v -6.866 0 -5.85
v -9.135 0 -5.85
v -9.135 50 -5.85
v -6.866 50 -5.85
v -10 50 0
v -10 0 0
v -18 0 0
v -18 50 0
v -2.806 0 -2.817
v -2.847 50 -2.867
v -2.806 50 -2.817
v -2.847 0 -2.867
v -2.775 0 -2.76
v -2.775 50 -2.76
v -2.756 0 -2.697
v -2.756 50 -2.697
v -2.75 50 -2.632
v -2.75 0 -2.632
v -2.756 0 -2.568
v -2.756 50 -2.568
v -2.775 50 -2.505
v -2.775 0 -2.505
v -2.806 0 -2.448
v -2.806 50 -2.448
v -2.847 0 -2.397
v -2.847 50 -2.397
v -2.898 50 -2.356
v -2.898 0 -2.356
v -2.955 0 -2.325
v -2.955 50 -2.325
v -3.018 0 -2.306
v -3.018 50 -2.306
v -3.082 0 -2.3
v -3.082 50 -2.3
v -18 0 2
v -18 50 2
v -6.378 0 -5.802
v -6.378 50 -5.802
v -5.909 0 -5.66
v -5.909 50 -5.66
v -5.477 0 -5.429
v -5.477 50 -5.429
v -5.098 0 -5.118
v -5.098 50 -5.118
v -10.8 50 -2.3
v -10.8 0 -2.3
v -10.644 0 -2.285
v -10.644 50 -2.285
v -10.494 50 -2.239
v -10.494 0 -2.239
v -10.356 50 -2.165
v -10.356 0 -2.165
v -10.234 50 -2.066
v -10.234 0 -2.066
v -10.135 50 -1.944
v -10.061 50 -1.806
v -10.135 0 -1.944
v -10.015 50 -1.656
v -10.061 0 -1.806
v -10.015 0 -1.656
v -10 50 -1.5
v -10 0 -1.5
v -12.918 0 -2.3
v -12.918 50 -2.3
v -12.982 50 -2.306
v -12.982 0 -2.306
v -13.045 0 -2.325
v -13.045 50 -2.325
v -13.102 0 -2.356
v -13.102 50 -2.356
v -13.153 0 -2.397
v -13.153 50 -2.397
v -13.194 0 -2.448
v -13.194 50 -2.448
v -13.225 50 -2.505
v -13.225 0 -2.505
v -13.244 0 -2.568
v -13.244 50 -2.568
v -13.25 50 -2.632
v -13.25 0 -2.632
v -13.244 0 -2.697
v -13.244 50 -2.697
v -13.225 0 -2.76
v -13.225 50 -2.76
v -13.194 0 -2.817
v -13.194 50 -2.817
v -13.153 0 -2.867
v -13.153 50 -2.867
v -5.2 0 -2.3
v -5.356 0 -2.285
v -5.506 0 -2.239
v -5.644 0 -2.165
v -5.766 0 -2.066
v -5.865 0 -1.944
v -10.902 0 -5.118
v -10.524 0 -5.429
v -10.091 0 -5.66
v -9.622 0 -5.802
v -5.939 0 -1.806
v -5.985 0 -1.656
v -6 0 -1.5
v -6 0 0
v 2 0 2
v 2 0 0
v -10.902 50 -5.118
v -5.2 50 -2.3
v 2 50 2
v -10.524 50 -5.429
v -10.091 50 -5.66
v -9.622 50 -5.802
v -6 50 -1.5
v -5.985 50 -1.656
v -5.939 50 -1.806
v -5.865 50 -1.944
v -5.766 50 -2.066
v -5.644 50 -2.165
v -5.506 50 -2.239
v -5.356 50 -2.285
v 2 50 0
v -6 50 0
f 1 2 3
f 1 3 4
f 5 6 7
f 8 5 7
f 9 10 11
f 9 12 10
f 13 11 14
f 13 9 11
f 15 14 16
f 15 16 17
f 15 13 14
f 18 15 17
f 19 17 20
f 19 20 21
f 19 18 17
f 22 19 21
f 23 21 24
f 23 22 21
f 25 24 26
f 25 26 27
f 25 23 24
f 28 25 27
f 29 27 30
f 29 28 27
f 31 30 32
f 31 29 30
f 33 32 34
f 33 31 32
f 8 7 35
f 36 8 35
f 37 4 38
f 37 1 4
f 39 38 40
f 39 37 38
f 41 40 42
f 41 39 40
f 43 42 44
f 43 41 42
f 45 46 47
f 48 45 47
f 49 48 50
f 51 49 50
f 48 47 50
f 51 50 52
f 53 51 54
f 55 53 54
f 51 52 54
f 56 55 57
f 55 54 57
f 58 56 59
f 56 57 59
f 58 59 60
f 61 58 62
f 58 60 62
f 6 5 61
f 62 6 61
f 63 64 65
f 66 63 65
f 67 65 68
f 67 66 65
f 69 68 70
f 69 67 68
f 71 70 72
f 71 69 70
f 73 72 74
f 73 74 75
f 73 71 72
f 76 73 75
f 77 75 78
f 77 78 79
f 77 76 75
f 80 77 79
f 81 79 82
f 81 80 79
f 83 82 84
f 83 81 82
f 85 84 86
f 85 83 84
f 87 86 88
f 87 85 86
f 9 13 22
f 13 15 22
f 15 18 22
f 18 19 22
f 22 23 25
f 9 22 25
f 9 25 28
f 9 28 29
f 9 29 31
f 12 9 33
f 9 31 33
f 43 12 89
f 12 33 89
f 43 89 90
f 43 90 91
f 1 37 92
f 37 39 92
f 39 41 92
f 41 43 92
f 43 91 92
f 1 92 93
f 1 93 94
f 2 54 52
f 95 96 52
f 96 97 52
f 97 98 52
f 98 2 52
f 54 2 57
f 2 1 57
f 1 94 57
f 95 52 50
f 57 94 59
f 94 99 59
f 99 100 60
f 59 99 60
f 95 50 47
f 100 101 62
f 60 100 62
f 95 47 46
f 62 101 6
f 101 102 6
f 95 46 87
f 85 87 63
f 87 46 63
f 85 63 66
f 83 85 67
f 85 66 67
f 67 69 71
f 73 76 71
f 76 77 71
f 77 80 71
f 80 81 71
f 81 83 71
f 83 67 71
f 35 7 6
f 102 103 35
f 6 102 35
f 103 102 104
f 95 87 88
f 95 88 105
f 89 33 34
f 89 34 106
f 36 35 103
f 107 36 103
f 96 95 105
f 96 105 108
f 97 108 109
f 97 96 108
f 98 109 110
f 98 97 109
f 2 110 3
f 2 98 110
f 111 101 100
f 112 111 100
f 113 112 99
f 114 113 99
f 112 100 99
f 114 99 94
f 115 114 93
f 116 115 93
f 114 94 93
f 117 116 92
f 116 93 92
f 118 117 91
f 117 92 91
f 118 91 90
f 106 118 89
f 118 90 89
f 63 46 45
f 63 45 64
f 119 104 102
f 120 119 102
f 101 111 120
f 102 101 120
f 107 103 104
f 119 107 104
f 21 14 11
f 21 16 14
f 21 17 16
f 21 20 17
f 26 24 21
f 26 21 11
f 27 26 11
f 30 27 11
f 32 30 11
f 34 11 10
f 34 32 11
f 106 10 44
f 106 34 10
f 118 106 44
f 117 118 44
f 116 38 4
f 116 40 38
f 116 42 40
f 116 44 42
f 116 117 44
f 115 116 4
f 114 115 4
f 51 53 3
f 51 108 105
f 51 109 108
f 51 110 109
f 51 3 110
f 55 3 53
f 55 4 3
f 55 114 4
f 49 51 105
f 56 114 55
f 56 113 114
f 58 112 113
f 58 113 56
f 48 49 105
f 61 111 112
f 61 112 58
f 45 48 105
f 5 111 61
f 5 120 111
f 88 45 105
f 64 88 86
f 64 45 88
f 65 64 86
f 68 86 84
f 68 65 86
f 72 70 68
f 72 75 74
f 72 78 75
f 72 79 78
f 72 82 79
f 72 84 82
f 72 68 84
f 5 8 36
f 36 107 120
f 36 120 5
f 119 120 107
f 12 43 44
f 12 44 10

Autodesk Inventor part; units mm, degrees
ref_plane "YZ Plane" through (0, 0, 0) normal (1, 0, 0) x (0, 1, 0)
ref_plane "XZ Plane" through (0, 0, 0) normal (0, 1, 0) x (-1, 0, 0)
ref_plane "XY Plane" through (0, 0, 0) normal (0, 0, 1) x (1, 0, 0)
sketch "Szkic1" plane through (0, 0, 0) normal (0, 1, 0) x (-1, 0, 0)
  arc A0 (11.3, 0) -> (10.5, -0.8) centre (11.3, -0.8) ccw
  line L0 (10.5, -0.8) -> (10.5, -1.5)
  arc A1 (10.5, -1.5) -> (10.8, -1.8) centre (10.8, -1.5) ccw
  line L1 (10.8, -1.8) -> (12.9176, -1.8)
  arc A2 (13.5062, -3.221) -> (12.9176, -1.8) centre (12.9176, -2.6324) ccw
  line L2 (13.5062, -3.221) -> (11.2559, -5.4713)
  arc A3 (9.1346, -6.35) -> (11.2559, -5.4713) centre (9.1346, -3.35) ccw
  line L3 (9.1346, -6.35) -> (6.8654, -6.35)
  arc A4 (4.7441, -5.4713) -> (6.8654, -6.35) centre (6.8654, -3.35) ccw
  line L4 (4.7441, -5.4713) -> (2.4938, -3.221)
  arc A5 (3.0824, -1.8) -> (2.4938, -3.221) centre (3.0824, -2.6324) ccw
  line L5 (3.0824, -1.8) -> (5.2, -1.8)
  arc A6 (5.2, -1.8) -> (5.5, -1.5) centre (5.2, -1.5) ccw
  line L6 (5.5, -1.5) -> (5.5, -0.8)
  arc A7 (5.5, -0.8) -> (4.7, 0) centre (4.7, -0.8) ccw
  line L7 (0, 0) -> (4.7, 0)
  arc A8 (0, 0) -> (-2, -2) centre (0, -2) ccw
  line L8 (-2, -6.7) -> (-2, -2)
  arc A9 (-2, -6.7) -> (-1.2, -7.5) centre (-1.2, -6.7) ccw
  line L9 (-1.2, -7.5) -> (-0.5, -7.5)
  arc A10 (-0.5, -7.5) -> (-0.2, -7.2) centre (-0.5, -7.2) ccw
  line L10 (-0.2, -7.2) -> (-0.2, -5.0824)
  arc A11 (1.221, -4.4938) -> (-0.2, -5.0824) centre (0.6324, -5.0824) ccw
  line L11 (1.221, -4.4938) -> (3.4713, -6.7441)
  arc A12 (4.35, -8.8654) -> (3.4713, -6.7441) centre (1.35, -8.8654) ccw
  line L12 (4.35, -8.8654) -> (4.35, -11.1346)
  arc A13 (3.4713, -13.2559) -> (4.35, -11.1346) centre (1.35, -11.1346) ccw
  line L13 (3.4713, -13.2559) -> (1.221, -15.5062)
  arc A14 (-0.2, -14.9176) -> (1.221, -15.5062) centre (0.6324, -14.9176) ccw
  line L14 (-0.2, -14.9176) -> (-0.2, -12.8)
  arc A15 (-0.2, -12.8) -> (-0.5, -12.5) centre (-0.5, -12.8) ccw
  line L15 (-0.5, -12.5) -> (-1.2, -12.5)
  arc A16 (-1.2, -12.5) -> (-2, -13.3) centre (-1.2, -13.3) ccw
  line L16 (-2, -18) -> (-2, -13.3)
  arc A17 (-2, -18) -> (0, -20) centre (0, -18) ccw
  line L17 (4.7, -20) -> (0, -20)
  arc A18 (4.7, -20) -> (5.5, -19.2) centre (4.7, -19.2) ccw
  line L18 (5.5, -19.2) -> (5.5, -18.5)
  arc A19 (5.5, -18.5) -> (5.2, -18.2) centre (5.2, -18.5) ccw
  line L19 (5.2, -18.2) -> (3.0824, -18.2)
  arc A20 (2.4938, -16.779) -> (3.0824, -18.2) centre (3.0824, -17.3676) ccw
  line L20 (2.4938, -16.779) -> (4.7441, -14.5287)
  arc A21 (6.8654, -13.65) -> (4.7441, -14.5287) centre (6.8654, -16.65) ccw
  line L21 (6.8654, -13.65) -> (9.1346, -13.65)
  arc A22 (11.2559, -14.5287) -> (9.1346, -13.65) centre (9.1346, -16.65) ccw
  line L22 (11.2559, -14.5287) -> (13.5062, -16.779)
  arc A23 (12.9176, -18.2) -> (13.5062, -16.779) centre (12.9176, -17.3676) ccw
  line L23 (12.9176, -18.2) -> (10.8, -18.2)
  arc A24 (10.8, -18.2) -> (10.5, -18.5) centre (10.8, -18.5) ccw
  line L24 (10.5, -18.5) -> (10.5, -19.2)
  arc A25 (10.5, -19.2) -> (11.3, -20) centre (11.3, -19.2) ccw
  line L25 (16, -20) -> (11.3, -20)
  arc A26 (16, -20) -> (18, -18) centre (16, -18) ccw
  line L26 (18, -13.3) -> (18, -18)
  arc A27 (18, -13.3) -> (17.2, -12.5) centre (17.2, -13.3) ccw
  line L27 (17.2, -12.5) -> (16.5, -12.5)
  arc A28 (16.5, -12.5) -> (16.2, -12.8) centre (16.5, -12.8) ccw
  line L28 (16.2, -12.8) -> (16.2, -14.9176)
  arc A29 (14.779, -15.5062) -> (16.2, -14.9176) centre (15.3676, -14.9176) ccw
  line L29 (14.779, -15.5062) -> (12.5287, -13.2559)
  arc A30 (11.65, -11.1346) -> (12.5287, -13.2559) centre (14.65, -11.1346) ccw
  line L30 (11.65, -11.1346) -> (11.65, -8.8654)
  arc A31 (12.5287, -6.7441) -> (11.65, -8.8654) centre (14.65, -8.8654) ccw
  line L31 (12.5287, -6.7441) -> (14.779, -4.4938)
  arc A32 (16.2, -5.0824) -> (14.779, -4.4938) centre (15.3676, -5.0824) ccw
  line L32 (16.2, -5.0824) -> (16.2, -7.2)
  arc A33 (16.2, -7.2) -> (16.5, -7.5) centre (16.5, -7.2) ccw
  line L33 (16.5, -7.5) -> (17.2, -7.5)
  arc A34 (17.2, -7.5) -> (18, -6.7) centre (17.2, -6.7) ccw
  line L34 (18, -2) -> (18, -6.7)
  arc A35 (18, -2) -> (16, 0) centre (16, -2) ccw
  line L35 (11.3, 0) -> (16, 0)
  circle A36 centre (8, -10) radius 2.15
  line L36 (18, 2) -> (-2, 2)
  line L37 (-2, 2) -> (-2, 0)
  line L38 (-2, 0) -> (18, 0)
  line L39 (18, 0) -> (18, 2)
  line L40 (10.5, -1.8) -> (5.5, -1.8)
  line L41 (5.5, -1.8) -> (5.5, 0)
  line L42 (5.5, 0) -> (10.5, 0)
  line L43 (10.5, 0) -> (10.5, -1.8)
  point P0 (0, 0)
  point P1 (16, 0)
  point P2 (4.7, 0)
  dimension "d0" = 2
extrude "Wyciągnięcie proste1" add sketch "Szkic1" along normal blind 50 contours L38 L7 L37 L36 L39 L35 | L0 L43 L40 L41 L6 L38 | A1 L1 A2 L2 A3 L3 A4 L4 A5 L5 A6 L41 L40 L43
thicken "Pogrubienie1" operation add thickness 0.5 both sides no extend neighbours yes toward (-1, 0, 0) faces at (-5.5, 16.6667, -1.0333) (-5.4479, 33.3333, -1.669) (-4.4941, 16.6667, -1.8) (-2.4938, 33.3333, -2.0438) (-3.2439, 16.6667, -3.9711) (-5.5386, 33.3333, -6.0406) (-7.6218, 16.6667, -6.35) (-10.6346, 33.3333, -5.9481) (-12.006, 16.6667, -4.7212) (-13.1748, 33.3333, -1.8407) (-12.2117, 16.6667, -1.8) (-10.5402, 33.3333, -1.65) (-10.5, 16.6667, -1.2667)
properties part number "ZItemSpacer"
